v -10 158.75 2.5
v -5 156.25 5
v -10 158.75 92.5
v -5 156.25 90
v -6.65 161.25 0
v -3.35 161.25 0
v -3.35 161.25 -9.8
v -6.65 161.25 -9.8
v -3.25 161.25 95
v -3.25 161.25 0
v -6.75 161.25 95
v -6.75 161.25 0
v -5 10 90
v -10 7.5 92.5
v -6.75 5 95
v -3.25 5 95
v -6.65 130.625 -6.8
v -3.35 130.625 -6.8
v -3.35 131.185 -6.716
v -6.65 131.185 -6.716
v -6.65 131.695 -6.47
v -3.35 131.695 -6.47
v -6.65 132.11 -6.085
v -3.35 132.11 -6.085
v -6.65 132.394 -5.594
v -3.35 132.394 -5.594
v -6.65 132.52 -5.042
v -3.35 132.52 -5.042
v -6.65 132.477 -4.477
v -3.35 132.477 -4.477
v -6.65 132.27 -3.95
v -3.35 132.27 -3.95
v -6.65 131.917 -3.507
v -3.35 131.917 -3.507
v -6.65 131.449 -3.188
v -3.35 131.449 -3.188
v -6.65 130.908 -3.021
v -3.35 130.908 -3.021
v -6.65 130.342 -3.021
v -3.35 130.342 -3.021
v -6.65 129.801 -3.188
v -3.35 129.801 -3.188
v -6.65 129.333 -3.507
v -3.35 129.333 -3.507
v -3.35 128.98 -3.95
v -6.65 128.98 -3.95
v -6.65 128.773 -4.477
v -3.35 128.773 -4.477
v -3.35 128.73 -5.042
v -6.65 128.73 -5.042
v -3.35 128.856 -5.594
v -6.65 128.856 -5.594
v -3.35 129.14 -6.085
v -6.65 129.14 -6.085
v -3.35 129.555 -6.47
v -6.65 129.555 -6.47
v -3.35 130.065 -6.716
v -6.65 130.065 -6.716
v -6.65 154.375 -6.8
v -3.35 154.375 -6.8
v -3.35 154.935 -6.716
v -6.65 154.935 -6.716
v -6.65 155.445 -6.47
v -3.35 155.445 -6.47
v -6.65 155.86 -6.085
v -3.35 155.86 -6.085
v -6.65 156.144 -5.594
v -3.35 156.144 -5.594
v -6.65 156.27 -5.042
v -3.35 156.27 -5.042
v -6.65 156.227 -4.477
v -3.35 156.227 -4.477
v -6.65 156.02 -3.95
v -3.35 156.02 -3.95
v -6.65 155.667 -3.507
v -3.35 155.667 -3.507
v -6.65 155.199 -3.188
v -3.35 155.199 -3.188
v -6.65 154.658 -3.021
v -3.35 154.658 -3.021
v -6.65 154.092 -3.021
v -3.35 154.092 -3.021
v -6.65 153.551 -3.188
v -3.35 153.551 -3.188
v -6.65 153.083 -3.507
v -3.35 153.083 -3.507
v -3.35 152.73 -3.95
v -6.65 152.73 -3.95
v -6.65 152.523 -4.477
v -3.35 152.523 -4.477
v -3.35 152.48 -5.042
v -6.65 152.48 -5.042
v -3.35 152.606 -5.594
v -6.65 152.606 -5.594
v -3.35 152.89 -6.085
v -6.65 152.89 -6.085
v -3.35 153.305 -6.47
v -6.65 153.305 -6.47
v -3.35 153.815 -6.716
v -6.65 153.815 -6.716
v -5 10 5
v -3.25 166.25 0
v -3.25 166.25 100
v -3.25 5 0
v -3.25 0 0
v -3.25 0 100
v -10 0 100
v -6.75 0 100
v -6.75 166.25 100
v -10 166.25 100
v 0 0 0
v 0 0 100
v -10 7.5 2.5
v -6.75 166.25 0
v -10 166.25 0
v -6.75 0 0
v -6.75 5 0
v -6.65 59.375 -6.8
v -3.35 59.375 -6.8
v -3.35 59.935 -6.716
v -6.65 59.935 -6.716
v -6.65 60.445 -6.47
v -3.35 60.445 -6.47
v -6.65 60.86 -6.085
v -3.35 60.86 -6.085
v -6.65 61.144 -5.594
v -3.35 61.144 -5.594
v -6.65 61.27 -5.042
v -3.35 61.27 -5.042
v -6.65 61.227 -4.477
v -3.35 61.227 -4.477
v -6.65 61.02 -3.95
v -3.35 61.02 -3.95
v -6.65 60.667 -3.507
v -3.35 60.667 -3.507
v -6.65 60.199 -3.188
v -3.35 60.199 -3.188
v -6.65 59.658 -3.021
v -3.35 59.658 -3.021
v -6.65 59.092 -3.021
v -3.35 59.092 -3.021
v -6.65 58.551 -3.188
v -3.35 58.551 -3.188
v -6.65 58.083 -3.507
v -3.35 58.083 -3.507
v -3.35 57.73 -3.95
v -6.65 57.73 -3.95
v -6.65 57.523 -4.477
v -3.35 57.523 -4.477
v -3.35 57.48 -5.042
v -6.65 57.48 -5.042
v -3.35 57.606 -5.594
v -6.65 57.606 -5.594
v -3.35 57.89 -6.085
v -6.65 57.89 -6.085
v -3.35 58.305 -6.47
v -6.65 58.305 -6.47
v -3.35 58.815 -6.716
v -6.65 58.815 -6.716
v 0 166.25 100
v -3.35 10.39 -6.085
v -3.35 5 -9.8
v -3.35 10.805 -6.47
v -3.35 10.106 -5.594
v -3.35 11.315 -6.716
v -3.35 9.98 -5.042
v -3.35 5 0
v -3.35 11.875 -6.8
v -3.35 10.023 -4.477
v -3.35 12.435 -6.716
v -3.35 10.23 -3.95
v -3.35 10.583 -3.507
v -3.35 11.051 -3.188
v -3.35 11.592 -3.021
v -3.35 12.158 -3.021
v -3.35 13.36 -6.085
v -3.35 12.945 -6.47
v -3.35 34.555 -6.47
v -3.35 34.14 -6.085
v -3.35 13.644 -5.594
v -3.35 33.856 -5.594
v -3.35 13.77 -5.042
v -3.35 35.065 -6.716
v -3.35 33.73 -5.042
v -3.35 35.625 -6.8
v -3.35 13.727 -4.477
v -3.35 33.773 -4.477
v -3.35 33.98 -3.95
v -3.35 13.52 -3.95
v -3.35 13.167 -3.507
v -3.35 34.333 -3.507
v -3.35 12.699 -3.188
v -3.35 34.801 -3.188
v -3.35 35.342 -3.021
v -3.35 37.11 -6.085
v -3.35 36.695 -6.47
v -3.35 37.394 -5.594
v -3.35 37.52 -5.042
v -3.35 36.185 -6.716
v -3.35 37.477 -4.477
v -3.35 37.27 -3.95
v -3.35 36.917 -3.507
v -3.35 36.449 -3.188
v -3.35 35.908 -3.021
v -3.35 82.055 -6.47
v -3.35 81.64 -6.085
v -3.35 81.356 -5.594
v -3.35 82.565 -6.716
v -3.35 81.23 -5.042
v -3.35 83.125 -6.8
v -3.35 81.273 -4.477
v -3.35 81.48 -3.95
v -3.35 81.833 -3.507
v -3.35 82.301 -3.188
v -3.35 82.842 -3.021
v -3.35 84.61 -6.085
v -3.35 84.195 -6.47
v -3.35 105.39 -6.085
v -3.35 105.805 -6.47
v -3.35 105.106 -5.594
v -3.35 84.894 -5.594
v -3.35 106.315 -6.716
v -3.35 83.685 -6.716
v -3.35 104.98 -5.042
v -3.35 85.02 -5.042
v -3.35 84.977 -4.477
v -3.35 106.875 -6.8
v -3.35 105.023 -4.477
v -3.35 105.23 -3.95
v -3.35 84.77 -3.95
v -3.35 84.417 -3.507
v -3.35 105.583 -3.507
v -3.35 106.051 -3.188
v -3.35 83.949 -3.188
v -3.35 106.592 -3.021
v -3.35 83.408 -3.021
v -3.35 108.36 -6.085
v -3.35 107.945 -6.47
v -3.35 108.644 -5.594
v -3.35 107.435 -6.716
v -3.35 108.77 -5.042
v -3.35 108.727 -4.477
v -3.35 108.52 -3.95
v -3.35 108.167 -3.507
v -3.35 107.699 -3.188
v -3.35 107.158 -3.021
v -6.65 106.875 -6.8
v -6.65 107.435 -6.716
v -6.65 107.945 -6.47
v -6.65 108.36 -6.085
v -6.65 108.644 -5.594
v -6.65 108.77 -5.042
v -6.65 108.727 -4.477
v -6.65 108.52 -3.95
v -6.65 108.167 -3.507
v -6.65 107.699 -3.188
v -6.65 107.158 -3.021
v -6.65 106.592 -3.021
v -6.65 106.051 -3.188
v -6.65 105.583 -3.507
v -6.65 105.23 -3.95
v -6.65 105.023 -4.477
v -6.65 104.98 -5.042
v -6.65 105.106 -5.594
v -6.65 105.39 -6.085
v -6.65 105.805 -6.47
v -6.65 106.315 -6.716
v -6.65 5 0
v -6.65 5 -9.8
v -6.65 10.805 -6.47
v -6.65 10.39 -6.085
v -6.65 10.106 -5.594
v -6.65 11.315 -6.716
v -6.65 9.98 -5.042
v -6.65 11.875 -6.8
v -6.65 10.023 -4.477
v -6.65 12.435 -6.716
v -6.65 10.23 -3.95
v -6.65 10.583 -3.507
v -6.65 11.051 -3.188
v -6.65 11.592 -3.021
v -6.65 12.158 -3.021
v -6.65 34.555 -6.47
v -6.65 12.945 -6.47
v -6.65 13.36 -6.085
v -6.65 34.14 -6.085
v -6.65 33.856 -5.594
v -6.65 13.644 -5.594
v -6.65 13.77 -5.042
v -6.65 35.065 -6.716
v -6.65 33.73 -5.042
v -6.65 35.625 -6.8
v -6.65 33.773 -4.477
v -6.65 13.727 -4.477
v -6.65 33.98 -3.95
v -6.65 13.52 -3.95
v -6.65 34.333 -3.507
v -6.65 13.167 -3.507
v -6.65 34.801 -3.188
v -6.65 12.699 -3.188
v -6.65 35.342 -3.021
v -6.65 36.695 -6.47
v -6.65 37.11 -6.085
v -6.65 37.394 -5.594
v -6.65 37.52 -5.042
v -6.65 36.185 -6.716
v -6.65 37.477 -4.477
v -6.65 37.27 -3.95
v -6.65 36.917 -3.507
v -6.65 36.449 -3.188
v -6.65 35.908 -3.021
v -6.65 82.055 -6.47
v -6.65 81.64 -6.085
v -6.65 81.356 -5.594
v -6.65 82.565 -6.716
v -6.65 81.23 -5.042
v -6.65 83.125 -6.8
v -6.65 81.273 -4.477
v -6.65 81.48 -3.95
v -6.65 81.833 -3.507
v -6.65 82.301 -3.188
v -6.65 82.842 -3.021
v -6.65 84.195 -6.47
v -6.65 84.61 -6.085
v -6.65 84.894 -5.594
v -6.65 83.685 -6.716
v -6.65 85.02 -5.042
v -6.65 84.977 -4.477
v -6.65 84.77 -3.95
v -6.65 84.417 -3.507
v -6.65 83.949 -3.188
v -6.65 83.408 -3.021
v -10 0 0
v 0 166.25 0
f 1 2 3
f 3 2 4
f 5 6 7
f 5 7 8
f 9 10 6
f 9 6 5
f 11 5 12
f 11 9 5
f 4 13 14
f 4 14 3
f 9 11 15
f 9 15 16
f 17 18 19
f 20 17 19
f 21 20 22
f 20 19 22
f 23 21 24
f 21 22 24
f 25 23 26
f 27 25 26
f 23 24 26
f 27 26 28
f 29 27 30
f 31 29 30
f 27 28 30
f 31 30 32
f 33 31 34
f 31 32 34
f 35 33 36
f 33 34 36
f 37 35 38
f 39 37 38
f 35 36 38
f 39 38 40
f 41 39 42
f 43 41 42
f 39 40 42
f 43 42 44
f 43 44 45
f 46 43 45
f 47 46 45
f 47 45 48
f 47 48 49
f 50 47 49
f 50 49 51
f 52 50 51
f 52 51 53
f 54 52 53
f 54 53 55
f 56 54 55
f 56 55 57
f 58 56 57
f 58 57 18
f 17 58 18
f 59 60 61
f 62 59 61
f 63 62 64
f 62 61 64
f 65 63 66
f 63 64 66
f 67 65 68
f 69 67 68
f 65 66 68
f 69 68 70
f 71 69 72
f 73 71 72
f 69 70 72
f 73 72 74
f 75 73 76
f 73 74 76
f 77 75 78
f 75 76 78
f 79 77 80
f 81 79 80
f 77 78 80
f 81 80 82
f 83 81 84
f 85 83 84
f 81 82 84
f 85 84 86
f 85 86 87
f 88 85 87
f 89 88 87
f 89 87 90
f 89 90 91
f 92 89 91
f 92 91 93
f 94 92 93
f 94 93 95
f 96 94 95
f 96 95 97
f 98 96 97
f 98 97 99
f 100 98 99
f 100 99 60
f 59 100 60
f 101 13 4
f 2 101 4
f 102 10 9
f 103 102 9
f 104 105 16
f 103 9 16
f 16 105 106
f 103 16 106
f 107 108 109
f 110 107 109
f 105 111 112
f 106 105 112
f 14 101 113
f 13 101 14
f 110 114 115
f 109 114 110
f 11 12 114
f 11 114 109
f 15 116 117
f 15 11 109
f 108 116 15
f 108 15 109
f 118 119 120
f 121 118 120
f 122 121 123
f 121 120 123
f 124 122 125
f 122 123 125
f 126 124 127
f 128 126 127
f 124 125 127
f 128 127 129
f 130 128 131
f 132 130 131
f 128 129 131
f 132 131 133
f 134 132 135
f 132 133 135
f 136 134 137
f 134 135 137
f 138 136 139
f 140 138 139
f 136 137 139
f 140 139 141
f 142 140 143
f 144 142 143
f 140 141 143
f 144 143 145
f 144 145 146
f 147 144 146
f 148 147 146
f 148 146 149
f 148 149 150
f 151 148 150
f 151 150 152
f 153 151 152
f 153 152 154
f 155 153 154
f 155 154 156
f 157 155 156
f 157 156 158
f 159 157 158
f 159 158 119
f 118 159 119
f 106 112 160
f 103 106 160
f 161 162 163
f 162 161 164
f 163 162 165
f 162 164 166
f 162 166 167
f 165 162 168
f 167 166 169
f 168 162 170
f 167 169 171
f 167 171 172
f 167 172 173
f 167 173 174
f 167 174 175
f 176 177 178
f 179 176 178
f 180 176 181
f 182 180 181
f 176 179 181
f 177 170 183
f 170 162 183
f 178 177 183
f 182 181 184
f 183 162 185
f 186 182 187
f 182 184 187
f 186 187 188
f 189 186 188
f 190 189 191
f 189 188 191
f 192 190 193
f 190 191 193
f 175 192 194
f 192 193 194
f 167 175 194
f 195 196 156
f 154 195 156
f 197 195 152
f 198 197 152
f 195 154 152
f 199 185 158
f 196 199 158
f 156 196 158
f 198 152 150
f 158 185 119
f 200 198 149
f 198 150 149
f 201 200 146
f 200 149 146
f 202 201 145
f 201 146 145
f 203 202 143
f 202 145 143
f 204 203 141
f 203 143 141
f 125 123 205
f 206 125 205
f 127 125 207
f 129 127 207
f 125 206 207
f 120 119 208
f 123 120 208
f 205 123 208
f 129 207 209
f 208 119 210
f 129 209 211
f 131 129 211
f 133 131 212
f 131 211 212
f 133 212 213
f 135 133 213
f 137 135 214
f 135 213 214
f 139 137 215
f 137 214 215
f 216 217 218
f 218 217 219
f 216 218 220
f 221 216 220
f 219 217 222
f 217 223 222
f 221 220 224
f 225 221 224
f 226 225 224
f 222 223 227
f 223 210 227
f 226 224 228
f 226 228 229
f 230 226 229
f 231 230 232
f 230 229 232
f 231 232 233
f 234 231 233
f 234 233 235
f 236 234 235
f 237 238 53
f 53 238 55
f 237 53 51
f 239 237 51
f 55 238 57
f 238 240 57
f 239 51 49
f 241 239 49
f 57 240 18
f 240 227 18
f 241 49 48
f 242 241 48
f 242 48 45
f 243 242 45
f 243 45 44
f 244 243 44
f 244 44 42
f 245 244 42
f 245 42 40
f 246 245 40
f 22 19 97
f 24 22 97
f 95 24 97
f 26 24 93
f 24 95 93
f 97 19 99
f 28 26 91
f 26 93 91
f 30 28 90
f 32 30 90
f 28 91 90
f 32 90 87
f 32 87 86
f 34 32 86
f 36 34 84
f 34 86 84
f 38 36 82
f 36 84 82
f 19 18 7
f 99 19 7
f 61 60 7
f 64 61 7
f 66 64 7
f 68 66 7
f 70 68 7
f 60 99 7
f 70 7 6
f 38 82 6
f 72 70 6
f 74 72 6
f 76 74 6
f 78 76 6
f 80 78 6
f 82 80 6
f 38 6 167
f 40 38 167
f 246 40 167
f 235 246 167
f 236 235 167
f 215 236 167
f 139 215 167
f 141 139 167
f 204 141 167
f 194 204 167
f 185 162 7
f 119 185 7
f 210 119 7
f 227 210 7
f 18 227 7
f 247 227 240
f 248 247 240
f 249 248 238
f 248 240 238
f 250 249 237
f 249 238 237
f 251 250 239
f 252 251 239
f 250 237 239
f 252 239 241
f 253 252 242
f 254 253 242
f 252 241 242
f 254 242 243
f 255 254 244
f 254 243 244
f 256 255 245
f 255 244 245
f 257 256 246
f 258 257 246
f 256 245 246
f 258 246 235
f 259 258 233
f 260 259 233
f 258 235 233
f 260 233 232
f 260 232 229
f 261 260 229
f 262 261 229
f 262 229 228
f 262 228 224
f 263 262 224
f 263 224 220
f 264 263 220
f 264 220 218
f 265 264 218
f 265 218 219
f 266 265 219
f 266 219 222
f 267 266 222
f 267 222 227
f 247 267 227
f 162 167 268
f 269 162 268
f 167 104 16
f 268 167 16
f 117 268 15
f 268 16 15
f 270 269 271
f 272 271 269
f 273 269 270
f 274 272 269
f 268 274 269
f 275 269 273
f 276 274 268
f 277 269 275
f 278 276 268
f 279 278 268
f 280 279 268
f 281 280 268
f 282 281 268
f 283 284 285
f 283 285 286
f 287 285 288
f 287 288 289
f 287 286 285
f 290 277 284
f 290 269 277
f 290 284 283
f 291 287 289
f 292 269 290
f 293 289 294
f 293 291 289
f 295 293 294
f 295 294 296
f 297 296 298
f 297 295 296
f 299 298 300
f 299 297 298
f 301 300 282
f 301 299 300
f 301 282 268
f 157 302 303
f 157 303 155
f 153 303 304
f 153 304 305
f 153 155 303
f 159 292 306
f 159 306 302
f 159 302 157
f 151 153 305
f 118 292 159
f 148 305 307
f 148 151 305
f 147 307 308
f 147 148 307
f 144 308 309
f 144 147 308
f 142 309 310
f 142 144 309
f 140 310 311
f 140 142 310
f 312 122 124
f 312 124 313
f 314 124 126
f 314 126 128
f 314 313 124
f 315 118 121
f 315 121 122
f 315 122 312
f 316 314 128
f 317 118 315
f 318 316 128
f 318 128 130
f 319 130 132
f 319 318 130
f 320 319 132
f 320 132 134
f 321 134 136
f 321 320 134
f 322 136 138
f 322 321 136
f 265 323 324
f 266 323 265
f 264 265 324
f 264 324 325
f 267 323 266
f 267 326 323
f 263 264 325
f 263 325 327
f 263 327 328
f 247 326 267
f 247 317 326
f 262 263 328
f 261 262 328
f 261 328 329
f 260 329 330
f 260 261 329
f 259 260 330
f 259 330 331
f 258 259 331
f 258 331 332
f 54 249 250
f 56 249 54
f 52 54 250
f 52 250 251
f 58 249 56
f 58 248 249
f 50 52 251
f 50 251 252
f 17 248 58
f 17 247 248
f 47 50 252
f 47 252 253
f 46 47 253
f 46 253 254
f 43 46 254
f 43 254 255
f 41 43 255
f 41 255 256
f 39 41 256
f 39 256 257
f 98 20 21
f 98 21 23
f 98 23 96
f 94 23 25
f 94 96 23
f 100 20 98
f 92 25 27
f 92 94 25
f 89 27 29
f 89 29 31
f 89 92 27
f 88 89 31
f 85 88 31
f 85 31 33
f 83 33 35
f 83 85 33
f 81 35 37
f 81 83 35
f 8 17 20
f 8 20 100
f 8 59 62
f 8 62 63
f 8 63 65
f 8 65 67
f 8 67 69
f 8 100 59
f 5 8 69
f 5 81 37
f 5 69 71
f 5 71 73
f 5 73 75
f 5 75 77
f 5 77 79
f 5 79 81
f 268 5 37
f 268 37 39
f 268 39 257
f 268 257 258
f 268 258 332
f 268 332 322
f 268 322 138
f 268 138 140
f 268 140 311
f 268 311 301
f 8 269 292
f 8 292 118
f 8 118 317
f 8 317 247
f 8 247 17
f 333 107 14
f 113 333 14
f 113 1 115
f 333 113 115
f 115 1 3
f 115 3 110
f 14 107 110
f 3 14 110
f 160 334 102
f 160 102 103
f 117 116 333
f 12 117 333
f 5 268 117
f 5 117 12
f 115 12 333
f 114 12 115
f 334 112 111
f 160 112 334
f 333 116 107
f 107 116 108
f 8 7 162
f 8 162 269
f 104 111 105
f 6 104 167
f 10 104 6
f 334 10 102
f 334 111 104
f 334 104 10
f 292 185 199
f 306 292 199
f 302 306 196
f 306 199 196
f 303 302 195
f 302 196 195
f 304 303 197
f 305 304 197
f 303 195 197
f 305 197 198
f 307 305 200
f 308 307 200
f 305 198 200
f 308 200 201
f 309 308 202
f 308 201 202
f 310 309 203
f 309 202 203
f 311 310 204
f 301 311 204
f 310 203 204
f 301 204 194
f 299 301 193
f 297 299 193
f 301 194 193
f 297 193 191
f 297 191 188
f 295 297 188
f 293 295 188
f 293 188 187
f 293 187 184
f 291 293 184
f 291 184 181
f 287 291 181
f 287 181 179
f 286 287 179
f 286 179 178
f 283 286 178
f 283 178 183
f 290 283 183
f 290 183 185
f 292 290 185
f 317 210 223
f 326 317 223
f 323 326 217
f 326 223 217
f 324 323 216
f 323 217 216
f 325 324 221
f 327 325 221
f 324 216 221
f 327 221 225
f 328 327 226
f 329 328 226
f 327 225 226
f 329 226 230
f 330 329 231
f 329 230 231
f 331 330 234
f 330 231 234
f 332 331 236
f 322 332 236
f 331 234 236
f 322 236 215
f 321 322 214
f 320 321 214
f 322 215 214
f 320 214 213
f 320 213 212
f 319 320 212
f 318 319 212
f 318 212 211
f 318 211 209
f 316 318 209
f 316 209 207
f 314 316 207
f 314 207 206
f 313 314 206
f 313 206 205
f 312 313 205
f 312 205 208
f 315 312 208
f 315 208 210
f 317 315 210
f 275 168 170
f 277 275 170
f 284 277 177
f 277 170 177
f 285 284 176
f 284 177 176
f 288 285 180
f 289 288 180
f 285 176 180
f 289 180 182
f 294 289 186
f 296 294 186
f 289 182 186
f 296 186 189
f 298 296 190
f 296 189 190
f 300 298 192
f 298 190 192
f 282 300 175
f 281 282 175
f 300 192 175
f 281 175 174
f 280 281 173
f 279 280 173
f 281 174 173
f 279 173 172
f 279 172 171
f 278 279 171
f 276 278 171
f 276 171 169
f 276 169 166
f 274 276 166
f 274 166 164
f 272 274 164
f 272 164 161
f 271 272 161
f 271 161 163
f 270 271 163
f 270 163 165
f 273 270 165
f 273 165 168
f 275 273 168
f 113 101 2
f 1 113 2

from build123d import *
from OCP.BRepFilletAPI import BRepFilletAPI_MakeChamfer

# Parameters (mm, degrees)
SKETCH1_W           = 166.25
SKETCH1_H           = 100
BOSS_EXTRUDE1_DEPTH = 10
SKETCH2_W           = 3.3
SKETCH2_H           = 9.8
BOSS_EXTRUDE2_DEPTH = 166.25
SKETCH3_W           = 3.5
SKETCH3_H           = 109.8
CUT_EXTRUDE1_DEPTH  = 5
CUT_EXTRUDE2_REACH  = 196.122
SKETCH4_R           = 1.9
LPATTERN1_COUNT     = 7
LPATTERN1_PITCH     = 23.75
SKETCH5_W           = 3.5
SKETCH5_H           = 156.25
CUT_EXTRUDE3_DEPTH  = 5
SKETCH6_W           = 146.25
SKETCH6_H           = 85
CUT_EXTRUDE4_DEPTH  = 5
CHAMFER1_SIZE       = 2.5
CHAMFER1_SIZE_2     = 5


with BuildPart() as part:
    # Sketch1 → Boss-Extrude1 (new body)
    with BuildSketch(Plane.YZ):
        with Locations((83.125, 50)):
            Rectangle(SKETCH1_W, SKETCH1_H)
    extrude(amount=-BOSS_EXTRUDE1_DEPTH)

    # Sketch2 → Boss-Extrude2 (add)
    with BuildSketch(Plane(origin=(0, 166.25, 0), x_dir=(-1, 0, 0), z_dir=(0, 1, 0))):
        with Locations((5, -4.9)):
            Rectangle(SKETCH2_W, SKETCH2_H)
    extrude(amount=-BOSS_EXTRUDE2_DEPTH)

    # Sketch3 → Cut-Extrude1 (cut)
    with BuildSketch(Plane(origin=(0, 166.25, 0), x_dir=(-1, 0, 0), z_dir=(0, 1, 0))):
        with Locations((5, 45.1)):
            Rectangle(SKETCH3_W, SKETCH3_H)
    cut_extrude1 = extrude(amount=-CUT_EXTRUDE1_DEPTH, mode=Mode.SUBTRACT)

    # Mirror1: Cut-Extrude1 across plane
    add(cut_extrude1.mirror(Plane.ZX.offset(83.125)), mode=Mode.SUBTRACT)

    # Sketch4 → Cut-Extrude2 (cut, up to next)
    with BuildSketch(Plane.YZ.offset(-3.35), mode=Mode.PRIVATE) as cut_extrude2_sk1:
        with Locations(Location((11.875, -4.9, 0), (0, 0, 270))):
            Circle(SKETCH4_R)
    cut_extrude2_tool1 = extrude(cut_extrude2_sk1.sketch, amount=-CUT_EXTRUDE2_REACH, mode=Mode.PRIVATE) & part.part
    cut_extrude2 = cut_extrude2_tool1.solids().sort_by_distance((-3.35, 11.875, -4.9))[0]
    add(cut_extrude2, mode=Mode.SUBTRACT)

    # LPattern1: Cut-Extrude2 ×7
    with Locations(*[(0, i * LPATTERN1_PITCH, 0) for i in range(1, LPATTERN1_COUNT)]):
        add(cut_extrude2, mode=Mode.SUBTRACT)

    # Sketch5 → Cut-Extrude3 (cut)
    with BuildSketch(Plane.XY.offset(100)):
        with Locations((-5, 83.125)):
            Rectangle(SKETCH5_W, SKETCH5_H)
    extrude(amount=-CUT_EXTRUDE3_DEPTH, mode=Mode.SUBTRACT)

    # Sketch6 → Cut-Extrude4 (cut)
    with BuildSketch(Plane.YZ.offset(-10)):
        with Locations((83.125, 47.5)):
            Rectangle(SKETCH6_W, SKETCH6_H)
    extrude(amount=CUT_EXTRUDE4_DEPTH, mode=Mode.SUBTRACT)

    # Chamfer1
    chamfer1_edges_1 = [part.edges().sort_by_distance(p)[0] for p in [
        (-10, 10, 47.5),
    ]]
    chamfer1_side_1 = [part.faces().sort_by_distance(p)[0] for p in [
        (-10, 9.95, 47.5),
    ]]
    chamfer1_edges_2 = [part.edges().sort_by_distance(p)[0] for p in [
        (-10, 83.125, 5),
    ]]
    chamfer1_side_2 = [part.faces().sort_by_distance(p)[0] for p in [
        (-10, 83.125, 4.95),
    ]]
    chamfer1_edges_3 = [part.edges().sort_by_distance(p)[0] for p in [
        (-10, 156.25, 47.5),
    ]]
    chamfer1_side_3 = [part.faces().sort_by_distance(p)[0] for p in [
        (-10, 156.3, 47.5),
    ]]
    chamfer1_edges_4 = [part.edges().sort_by_distance(p)[0] for p in [
        (-10, 83.125, 90),
    ]]
    chamfer1_side_4 = [part.faces().sort_by_distance(p)[0] for p in [
        (-10, 83.125, 90.05),
    ]]
    chamfer1 = BRepFilletAPI_MakeChamfer(part.part.solid().wrapped)
    for e in chamfer1_edges_1:
        chamfer1.Add(CHAMFER1_SIZE - 0.0001, CHAMFER1_SIZE_2 - 0.0001, e.wrapped, chamfer1_side_1[0].wrapped)
    for e in chamfer1_edges_2:
        chamfer1.Add(CHAMFER1_SIZE - 0.0001, CHAMFER1_SIZE_2 - 0.0001, e.wrapped, chamfer1_side_2[0].wrapped)
    for e in chamfer1_edges_3:
        chamfer1.Add(CHAMFER1_SIZE - 0.0001, CHAMFER1_SIZE_2 - 0.0001, e.wrapped, chamfer1_side_3[0].wrapped)
    for e in chamfer1_edges_4:
        chamfer1.Add(CHAMFER1_SIZE - 0.0001, CHAMFER1_SIZE_2 - 0.0001, e.wrapped, chamfer1_side_4[0].wrapped)
    add(Compound.cast(chamfer1.Shape()), mode=Mode.REPLACE)  # a hair under: the kernel refuses the full size


solid = part.part
